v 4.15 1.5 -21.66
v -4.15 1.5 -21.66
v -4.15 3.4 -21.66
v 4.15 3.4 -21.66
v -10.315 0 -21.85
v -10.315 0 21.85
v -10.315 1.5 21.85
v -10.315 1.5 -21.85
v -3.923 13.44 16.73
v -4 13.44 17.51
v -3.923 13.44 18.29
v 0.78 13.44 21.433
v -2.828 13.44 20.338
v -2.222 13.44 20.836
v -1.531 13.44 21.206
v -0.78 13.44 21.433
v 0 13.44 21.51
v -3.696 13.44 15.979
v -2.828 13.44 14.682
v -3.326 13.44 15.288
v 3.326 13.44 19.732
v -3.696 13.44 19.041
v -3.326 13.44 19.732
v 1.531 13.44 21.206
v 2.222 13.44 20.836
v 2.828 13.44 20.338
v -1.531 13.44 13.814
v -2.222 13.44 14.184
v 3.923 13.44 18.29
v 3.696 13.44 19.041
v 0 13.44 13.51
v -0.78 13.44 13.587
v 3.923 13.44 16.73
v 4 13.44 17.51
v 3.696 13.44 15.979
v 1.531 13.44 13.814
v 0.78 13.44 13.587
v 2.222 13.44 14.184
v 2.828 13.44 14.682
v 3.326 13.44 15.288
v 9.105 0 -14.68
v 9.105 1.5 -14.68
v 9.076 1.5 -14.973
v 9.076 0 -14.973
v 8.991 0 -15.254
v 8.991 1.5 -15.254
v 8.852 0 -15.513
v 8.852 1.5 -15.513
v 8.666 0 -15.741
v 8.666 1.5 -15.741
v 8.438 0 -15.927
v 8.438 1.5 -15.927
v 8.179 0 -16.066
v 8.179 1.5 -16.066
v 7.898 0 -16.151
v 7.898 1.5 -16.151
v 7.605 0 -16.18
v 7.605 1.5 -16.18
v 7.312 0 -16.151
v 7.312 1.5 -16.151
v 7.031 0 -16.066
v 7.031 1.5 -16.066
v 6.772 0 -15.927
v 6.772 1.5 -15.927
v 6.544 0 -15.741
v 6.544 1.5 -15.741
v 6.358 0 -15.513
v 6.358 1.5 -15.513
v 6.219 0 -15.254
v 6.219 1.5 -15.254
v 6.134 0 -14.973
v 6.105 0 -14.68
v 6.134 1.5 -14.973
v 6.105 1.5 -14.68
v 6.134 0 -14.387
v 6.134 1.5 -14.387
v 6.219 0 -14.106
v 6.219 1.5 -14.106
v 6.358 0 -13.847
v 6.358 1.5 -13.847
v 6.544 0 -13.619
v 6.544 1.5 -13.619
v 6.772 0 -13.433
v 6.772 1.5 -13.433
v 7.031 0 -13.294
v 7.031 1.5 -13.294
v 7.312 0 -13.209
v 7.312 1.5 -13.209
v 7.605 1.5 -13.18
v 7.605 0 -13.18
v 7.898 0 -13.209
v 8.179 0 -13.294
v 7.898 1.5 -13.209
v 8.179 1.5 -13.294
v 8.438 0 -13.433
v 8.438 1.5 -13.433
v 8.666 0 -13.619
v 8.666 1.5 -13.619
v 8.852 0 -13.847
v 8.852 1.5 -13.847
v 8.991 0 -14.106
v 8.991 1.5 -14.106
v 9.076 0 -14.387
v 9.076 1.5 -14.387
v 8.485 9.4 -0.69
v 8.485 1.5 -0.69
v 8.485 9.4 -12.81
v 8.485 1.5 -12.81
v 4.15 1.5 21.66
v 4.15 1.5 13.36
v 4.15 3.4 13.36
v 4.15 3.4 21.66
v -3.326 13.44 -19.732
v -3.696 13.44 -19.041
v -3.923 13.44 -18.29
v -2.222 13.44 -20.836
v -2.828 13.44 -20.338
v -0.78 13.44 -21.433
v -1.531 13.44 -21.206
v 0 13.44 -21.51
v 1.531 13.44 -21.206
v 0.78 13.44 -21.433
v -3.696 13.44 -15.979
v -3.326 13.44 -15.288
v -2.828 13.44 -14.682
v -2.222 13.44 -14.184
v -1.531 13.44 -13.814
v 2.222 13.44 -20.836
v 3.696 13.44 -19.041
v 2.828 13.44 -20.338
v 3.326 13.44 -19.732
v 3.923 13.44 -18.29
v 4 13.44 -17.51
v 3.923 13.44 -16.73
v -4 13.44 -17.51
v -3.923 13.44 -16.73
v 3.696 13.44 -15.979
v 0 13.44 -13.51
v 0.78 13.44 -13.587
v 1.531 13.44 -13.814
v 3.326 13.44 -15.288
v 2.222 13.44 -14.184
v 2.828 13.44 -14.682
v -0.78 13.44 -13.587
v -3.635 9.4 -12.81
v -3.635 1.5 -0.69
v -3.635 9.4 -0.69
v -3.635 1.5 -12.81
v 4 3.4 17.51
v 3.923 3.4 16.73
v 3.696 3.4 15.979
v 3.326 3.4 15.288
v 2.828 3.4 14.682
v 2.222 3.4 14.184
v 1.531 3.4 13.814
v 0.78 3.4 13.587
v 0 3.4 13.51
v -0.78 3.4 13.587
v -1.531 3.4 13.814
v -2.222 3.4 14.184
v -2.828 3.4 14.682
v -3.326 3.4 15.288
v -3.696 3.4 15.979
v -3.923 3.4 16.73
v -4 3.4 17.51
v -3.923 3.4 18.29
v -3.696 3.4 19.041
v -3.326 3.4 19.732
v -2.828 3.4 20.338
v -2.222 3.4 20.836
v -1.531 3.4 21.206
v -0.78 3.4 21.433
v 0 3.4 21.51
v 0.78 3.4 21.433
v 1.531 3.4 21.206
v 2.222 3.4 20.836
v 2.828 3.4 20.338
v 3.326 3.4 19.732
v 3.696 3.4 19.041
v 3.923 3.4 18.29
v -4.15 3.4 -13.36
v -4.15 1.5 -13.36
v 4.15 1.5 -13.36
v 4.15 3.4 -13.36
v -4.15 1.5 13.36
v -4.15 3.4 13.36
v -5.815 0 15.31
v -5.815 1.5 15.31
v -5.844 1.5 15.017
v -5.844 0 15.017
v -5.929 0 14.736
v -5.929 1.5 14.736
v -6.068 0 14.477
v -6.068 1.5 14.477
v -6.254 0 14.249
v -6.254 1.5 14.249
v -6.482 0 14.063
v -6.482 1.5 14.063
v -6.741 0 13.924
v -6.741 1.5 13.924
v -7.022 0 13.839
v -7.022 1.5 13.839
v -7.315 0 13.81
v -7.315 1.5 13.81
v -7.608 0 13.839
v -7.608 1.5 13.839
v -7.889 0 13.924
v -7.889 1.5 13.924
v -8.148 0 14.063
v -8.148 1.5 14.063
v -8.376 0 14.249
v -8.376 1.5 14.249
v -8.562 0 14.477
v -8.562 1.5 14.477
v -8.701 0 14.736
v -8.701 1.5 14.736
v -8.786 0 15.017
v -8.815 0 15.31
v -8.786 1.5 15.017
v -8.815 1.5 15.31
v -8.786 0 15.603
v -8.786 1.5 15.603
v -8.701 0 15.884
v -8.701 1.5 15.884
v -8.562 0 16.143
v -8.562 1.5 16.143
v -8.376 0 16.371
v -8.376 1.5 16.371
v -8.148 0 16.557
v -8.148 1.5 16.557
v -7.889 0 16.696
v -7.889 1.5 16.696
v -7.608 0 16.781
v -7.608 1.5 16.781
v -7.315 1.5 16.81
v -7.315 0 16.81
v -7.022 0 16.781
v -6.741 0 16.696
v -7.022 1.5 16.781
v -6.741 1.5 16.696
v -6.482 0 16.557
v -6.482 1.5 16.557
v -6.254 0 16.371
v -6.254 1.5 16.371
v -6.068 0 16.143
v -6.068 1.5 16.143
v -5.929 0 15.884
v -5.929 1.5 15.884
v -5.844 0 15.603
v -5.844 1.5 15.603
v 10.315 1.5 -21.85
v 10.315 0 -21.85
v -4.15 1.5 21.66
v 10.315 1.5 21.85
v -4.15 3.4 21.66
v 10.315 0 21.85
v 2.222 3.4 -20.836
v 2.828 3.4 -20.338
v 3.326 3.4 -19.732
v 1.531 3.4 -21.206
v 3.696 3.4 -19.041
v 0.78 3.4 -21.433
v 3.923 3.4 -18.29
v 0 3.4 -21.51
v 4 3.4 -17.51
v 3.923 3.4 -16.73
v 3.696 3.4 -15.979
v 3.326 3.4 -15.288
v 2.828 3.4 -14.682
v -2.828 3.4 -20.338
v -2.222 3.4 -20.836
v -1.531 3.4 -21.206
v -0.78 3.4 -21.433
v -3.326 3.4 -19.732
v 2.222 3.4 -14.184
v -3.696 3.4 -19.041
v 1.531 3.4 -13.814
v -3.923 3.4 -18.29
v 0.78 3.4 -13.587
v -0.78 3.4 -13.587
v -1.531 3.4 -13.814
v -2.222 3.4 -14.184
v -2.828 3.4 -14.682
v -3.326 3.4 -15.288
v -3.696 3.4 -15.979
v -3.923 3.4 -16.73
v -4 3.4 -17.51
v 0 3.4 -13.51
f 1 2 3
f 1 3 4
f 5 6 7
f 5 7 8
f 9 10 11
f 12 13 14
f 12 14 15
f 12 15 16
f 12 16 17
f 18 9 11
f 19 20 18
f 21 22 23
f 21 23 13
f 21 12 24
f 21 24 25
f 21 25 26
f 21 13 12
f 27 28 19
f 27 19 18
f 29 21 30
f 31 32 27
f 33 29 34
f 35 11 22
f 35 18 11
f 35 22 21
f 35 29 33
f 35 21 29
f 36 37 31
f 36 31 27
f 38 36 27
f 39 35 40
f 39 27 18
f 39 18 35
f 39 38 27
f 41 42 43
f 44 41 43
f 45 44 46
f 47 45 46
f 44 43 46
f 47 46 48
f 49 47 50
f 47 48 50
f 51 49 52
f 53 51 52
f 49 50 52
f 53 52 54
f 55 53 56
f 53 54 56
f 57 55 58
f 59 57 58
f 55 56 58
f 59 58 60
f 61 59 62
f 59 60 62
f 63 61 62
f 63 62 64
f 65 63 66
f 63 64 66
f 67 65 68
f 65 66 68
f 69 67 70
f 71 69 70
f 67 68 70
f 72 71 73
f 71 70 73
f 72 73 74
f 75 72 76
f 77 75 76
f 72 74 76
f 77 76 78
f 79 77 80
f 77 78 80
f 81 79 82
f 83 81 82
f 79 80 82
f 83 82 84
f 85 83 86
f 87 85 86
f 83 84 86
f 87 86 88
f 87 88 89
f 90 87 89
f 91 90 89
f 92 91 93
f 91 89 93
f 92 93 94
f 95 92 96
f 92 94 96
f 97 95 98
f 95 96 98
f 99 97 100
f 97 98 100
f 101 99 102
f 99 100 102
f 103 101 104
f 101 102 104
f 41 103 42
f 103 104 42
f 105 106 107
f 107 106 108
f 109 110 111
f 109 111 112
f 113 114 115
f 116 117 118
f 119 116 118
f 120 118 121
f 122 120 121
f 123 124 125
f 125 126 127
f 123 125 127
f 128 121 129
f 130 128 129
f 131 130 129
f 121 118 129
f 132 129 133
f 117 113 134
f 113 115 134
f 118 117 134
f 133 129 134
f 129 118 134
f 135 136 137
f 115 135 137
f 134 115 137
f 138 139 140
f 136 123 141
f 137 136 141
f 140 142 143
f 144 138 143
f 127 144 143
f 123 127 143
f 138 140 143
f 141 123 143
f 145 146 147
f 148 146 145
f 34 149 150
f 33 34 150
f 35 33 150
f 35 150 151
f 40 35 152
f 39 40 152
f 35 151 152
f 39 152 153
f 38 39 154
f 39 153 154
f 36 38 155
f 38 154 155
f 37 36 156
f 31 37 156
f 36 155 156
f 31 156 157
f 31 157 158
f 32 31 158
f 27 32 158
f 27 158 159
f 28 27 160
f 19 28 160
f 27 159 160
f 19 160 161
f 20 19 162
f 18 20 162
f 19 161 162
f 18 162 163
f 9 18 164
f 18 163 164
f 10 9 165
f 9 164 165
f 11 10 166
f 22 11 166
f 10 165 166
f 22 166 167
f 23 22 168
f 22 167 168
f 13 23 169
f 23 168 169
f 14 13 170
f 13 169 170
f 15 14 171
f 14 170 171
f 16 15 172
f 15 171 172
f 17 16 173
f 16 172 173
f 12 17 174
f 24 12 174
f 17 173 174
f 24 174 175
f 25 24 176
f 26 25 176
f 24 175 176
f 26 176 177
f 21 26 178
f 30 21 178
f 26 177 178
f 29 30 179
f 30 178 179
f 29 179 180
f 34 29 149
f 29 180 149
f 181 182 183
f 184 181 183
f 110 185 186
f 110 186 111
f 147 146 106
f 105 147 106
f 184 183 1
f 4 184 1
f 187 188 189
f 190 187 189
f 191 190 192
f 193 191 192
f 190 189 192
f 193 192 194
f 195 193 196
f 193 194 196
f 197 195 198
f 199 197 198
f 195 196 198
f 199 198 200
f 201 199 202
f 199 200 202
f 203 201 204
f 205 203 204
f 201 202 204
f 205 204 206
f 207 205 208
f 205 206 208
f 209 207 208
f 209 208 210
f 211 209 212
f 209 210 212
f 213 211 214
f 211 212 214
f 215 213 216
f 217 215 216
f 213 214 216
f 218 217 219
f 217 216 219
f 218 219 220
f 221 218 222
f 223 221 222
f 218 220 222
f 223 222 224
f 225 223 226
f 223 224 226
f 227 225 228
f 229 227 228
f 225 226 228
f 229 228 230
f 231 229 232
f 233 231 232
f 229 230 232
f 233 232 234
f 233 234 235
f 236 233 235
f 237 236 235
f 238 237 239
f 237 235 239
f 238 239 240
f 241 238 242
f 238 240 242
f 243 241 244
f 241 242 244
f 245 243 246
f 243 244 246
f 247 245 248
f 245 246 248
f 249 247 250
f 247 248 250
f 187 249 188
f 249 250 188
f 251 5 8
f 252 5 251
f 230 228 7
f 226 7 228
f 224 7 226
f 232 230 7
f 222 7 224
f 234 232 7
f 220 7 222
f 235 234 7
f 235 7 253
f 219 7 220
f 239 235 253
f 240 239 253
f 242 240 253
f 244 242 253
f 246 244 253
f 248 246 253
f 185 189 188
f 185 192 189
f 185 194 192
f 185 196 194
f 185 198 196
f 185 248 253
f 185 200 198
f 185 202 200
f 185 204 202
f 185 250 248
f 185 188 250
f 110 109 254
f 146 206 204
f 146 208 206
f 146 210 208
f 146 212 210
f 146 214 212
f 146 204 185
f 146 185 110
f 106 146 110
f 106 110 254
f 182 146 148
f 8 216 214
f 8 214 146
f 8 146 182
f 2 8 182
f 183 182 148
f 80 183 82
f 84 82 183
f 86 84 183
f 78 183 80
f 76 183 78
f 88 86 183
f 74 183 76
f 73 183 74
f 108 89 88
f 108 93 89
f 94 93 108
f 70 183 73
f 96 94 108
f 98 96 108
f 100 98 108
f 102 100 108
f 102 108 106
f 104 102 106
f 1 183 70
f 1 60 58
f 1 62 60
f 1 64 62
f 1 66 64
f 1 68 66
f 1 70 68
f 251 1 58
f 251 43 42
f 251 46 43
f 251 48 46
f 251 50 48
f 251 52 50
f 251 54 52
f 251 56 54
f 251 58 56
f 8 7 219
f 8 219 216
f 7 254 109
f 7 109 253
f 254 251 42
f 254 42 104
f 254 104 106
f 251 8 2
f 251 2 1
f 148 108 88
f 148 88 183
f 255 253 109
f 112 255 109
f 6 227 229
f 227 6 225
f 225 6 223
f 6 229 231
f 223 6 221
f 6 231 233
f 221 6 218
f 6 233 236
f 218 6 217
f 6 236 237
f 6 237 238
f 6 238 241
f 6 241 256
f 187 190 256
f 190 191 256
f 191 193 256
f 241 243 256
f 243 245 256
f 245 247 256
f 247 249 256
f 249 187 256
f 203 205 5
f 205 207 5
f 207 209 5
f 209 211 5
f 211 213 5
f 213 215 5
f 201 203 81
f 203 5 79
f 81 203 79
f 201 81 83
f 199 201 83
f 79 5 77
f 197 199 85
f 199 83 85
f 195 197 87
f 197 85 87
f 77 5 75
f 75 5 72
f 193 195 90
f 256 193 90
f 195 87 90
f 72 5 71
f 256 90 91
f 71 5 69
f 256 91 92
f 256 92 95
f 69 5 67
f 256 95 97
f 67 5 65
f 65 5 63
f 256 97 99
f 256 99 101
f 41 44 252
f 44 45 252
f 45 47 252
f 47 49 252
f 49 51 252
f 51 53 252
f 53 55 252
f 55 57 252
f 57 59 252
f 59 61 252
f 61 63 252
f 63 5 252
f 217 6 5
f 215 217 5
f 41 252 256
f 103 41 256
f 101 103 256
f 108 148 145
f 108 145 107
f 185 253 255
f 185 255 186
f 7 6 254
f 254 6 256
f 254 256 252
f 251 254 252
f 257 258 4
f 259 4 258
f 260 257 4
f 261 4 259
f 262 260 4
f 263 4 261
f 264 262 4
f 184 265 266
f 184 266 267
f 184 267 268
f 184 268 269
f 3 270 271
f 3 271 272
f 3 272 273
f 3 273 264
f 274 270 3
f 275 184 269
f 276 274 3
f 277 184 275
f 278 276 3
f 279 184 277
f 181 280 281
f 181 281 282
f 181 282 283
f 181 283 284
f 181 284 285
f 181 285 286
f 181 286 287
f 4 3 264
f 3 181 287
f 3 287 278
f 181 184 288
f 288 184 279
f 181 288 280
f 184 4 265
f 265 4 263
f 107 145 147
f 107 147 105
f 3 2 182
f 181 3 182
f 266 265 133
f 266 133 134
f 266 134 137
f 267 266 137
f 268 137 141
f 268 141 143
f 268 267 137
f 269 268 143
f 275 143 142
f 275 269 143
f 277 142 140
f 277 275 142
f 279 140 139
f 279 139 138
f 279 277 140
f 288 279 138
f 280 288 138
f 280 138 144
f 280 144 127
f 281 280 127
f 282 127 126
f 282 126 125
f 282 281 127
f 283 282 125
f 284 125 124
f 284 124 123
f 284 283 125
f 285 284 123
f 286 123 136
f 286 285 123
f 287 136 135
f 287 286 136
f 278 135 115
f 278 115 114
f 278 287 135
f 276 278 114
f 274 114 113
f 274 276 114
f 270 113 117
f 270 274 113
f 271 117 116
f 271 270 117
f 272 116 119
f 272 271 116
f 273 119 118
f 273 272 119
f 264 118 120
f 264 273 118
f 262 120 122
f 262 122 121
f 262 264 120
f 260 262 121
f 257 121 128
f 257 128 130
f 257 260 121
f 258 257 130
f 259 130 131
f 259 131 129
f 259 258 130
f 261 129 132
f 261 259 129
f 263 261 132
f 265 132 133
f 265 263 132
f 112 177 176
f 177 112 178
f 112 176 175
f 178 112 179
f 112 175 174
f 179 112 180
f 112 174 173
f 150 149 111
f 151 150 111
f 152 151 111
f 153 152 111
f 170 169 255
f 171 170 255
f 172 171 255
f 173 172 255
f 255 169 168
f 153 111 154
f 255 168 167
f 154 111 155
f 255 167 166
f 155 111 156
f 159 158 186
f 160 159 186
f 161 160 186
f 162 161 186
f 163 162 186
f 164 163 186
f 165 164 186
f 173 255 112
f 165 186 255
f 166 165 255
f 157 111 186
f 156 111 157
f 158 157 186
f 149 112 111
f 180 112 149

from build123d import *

# Parameters (mm, degrees)
SKETCH1_W           = 20.63
SKETCH1_H           = 43.7
BOSS_EXTRUDE1_DEPTH = 1.5
SKETCH2_R           = 1.5
CUT_EXTRUDE1_DEPTH  = 1.5
BOSS_EXTRUDE2_DEPTH = 1.9
SKETCH4_R           = 4
BOSS_EXTRUDE3_DEPTH = 10.04
SKETCH5_W           = 12.12
SKETCH5_H           = 12.12
BOSS_EXTRUDE4_DEPTH = 7.9


with BuildPart() as part:
    # Sketch1 → Boss-Extrude1 (new body)
    with BuildSketch(Plane(origin=(0, 0, 0), x_dir=(1, 0, 0), z_dir=(0, 1, 0))):
        Rectangle(SKETCH1_W, SKETCH1_H)
    extrude(amount=BOSS_EXTRUDE1_DEPTH)

    # Sketch2 → Cut-Extrude1 (cut)
    with BuildSketch(Plane(origin=(0, 1.5, 0), x_dir=(1, 0, 0), z_dir=(0, 1, 0))):
        with Locations((7.605, 14.68)):
            Circle(SKETCH2_R)
        with Locations((-7.315, -15.31)):
            Circle(SKETCH2_R)
    extrude(amount=-CUT_EXTRUDE1_DEPTH, mode=Mode.SUBTRACT)

    # Sketch3 → Boss-Extrude2 (add)
    with BuildSketch(Plane(origin=(0, 1.5, 0), x_dir=(1, 0, 0), z_dir=(0, 1, 0))):
        Polygon((0, -21.66), (-4.15, -21.66), (-4.15, -13.36), (4.15, -13.36), (4.15, -21.66), align=None)
    boss_extrude2 = extrude(amount=BOSS_EXTRUDE2_DEPTH)

    # Sketch4 → Boss-Extrude3 (add)
    with BuildSketch(Plane(origin=(0, 3.4, 0), x_dir=(1, 0, 0), z_dir=(0, 1, 0))):
        with Locations((0, -17.51)):
            Circle(SKETCH4_R)
    boss_extrude3 = extrude(amount=BOSS_EXTRUDE3_DEPTH)

    # Mirror1: Boss-Extrude2, Boss-Extrude3 across plane
    add(boss_extrude2.mirror(Plane.XY))
    add(boss_extrude3.mirror(Plane.XY))

    # Sketch5 → Boss-Extrude4 (add)
    with BuildSketch(Plane(origin=(0, 1.5, 0), x_dir=(1, 0, 0), z_dir=(0, 1, 0))):
        with Locations((2.425, 6.75)):
            Rectangle(SKETCH5_W, SKETCH5_H)
    extrude(amount=BOSS_EXTRUDE4_DEPTH)


solid = part.part
